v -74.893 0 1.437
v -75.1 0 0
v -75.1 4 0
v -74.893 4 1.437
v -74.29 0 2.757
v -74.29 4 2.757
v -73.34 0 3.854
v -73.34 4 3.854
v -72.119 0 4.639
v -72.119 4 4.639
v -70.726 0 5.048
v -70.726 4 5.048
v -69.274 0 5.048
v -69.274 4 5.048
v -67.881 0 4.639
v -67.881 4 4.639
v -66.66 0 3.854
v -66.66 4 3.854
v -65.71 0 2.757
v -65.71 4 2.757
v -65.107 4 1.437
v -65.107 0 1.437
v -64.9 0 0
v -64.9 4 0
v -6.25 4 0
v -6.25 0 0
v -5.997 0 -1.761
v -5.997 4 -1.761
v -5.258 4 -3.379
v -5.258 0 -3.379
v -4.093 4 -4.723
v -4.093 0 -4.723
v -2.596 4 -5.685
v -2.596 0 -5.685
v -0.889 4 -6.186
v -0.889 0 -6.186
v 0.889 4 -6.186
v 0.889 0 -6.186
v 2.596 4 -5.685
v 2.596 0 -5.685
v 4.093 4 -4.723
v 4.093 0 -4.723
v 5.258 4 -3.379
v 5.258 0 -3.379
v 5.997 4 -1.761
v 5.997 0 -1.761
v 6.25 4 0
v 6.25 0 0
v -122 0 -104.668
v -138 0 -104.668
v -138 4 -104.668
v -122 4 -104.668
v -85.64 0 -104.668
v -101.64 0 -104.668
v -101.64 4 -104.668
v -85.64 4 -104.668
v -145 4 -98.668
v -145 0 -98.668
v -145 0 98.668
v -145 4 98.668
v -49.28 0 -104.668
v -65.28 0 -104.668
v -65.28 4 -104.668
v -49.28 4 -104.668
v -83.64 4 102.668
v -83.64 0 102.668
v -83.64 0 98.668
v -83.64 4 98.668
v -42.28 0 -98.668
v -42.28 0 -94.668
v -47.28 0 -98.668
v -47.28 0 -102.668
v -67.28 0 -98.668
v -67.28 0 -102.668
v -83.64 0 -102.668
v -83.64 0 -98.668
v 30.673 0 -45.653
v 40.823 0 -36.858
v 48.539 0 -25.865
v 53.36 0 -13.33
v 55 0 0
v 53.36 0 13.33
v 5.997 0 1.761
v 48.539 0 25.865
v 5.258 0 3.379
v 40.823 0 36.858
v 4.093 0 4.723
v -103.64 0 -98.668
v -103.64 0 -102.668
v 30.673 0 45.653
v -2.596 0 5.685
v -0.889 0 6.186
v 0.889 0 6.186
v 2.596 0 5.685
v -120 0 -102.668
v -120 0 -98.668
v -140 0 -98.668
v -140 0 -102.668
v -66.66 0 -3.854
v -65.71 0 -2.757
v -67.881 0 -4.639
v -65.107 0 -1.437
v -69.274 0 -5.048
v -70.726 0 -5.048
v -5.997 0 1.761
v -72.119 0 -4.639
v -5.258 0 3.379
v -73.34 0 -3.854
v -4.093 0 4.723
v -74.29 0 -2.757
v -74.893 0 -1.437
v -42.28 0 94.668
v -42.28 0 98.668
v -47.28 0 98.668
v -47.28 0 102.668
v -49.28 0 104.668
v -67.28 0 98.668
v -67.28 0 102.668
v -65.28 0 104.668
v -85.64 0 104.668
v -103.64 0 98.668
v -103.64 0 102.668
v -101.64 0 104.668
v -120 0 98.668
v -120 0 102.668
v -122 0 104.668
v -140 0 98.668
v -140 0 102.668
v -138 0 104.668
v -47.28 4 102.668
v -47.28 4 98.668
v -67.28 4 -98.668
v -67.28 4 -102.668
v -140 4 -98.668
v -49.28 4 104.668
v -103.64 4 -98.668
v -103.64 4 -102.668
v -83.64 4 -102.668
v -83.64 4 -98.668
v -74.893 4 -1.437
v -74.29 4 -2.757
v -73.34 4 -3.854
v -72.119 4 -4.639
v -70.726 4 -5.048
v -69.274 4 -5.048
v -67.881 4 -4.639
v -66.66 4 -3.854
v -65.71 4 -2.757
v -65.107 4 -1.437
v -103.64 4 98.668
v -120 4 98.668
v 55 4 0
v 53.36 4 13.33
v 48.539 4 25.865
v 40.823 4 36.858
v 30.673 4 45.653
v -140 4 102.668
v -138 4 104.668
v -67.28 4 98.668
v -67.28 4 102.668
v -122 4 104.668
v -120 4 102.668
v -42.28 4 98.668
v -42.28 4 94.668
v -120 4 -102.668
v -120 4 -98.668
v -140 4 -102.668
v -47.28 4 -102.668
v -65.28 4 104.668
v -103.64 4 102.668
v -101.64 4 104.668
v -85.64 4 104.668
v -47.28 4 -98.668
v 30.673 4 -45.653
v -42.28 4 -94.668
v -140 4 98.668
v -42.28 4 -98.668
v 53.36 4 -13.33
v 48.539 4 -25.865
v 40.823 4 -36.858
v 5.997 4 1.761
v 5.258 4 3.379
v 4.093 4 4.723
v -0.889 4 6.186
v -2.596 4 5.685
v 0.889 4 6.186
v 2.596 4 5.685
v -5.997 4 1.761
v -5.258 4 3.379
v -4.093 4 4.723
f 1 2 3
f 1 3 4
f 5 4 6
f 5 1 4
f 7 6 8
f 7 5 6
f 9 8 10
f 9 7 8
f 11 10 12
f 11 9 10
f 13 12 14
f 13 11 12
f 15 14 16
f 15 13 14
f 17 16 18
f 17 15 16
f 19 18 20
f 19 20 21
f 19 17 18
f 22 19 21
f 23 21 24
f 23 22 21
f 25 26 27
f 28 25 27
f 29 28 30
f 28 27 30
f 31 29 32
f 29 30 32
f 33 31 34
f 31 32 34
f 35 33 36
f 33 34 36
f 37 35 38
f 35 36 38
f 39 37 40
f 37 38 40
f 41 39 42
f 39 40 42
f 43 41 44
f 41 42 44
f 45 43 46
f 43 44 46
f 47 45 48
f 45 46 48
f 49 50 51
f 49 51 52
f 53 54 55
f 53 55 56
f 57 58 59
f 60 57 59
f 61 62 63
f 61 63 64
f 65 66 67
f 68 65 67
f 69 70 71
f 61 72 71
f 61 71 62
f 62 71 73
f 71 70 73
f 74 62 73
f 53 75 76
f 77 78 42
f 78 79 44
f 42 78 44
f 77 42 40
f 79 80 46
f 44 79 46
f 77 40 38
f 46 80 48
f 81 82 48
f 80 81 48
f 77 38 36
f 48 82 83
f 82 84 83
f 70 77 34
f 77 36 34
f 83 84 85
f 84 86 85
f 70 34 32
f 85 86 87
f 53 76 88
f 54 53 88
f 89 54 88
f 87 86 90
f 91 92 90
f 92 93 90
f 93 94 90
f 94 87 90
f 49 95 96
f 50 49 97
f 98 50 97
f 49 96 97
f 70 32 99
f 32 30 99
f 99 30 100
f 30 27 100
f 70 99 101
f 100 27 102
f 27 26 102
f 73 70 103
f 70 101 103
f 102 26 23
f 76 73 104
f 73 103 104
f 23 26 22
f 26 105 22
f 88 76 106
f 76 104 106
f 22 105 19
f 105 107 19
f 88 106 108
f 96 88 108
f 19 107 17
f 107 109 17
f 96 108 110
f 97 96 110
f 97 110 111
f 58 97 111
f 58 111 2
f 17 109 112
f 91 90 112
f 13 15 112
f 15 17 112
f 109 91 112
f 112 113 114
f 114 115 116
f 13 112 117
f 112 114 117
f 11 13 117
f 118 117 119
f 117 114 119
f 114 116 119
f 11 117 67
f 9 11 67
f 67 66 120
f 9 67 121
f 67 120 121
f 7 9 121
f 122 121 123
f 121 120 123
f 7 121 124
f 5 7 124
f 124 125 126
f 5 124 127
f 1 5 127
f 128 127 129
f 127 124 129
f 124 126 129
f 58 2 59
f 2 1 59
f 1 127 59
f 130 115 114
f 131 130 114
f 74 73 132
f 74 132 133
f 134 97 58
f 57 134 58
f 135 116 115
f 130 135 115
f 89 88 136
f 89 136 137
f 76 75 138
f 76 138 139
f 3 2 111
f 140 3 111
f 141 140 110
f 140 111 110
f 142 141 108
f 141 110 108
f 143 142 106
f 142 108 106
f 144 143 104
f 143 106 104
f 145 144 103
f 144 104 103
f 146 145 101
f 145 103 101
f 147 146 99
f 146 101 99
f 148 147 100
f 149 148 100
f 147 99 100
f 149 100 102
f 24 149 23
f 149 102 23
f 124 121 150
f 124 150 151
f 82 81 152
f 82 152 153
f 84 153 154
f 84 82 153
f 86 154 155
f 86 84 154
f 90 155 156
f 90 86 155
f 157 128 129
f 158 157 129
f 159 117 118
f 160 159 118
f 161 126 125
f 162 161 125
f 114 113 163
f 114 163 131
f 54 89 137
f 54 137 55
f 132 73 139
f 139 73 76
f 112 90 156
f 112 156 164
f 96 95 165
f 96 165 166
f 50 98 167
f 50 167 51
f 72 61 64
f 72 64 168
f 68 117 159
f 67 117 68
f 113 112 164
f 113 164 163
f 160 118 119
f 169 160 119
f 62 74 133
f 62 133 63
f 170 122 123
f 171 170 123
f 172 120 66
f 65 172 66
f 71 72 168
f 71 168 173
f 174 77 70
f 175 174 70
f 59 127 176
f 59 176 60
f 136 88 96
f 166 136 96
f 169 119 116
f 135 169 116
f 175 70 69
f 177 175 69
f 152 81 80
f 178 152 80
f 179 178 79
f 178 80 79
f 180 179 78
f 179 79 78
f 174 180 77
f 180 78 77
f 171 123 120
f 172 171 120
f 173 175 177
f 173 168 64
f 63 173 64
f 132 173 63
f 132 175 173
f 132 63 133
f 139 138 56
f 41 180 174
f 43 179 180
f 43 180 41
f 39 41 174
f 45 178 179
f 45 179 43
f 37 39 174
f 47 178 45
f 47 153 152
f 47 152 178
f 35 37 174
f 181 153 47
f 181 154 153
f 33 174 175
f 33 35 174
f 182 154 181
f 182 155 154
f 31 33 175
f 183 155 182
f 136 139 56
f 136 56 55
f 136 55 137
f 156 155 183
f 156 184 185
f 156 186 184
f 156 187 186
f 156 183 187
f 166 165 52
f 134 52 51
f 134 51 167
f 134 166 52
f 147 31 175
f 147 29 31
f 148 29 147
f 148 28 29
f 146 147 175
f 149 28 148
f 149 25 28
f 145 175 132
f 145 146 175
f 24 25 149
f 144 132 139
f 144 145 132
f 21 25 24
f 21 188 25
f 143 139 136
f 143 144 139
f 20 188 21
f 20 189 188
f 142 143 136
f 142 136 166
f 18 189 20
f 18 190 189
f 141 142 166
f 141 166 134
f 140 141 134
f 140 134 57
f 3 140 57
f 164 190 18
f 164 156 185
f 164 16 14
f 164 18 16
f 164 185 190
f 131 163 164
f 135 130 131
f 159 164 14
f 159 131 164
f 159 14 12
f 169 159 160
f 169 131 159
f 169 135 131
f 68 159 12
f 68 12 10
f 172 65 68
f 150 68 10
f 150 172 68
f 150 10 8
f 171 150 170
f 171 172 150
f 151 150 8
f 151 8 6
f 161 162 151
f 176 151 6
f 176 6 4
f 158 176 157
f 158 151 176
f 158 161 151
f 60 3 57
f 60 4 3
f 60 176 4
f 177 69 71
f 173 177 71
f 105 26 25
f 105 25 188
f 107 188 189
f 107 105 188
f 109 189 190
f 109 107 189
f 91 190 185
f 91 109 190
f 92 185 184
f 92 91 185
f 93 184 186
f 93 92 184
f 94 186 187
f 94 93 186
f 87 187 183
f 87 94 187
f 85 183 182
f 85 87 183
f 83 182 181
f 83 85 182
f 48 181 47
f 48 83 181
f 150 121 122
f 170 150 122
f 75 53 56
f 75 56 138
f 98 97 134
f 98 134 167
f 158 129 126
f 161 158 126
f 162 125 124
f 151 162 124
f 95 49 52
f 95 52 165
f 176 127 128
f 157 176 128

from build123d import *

# Parameters (mm, degrees)
SM_BASE_FLANGE_1_DEPTH = 4
OTHER_1_DEPTH          = 4


# Read off the part's stored shape, not the designer's step: Выступы и прорези-Выступ1
# Sheet-metal steps are written as plain solids
with BuildPart() as part:
    # Sketch 1 → Базовая кромка1 (new body)
    with BuildSketch(Plane(origin=(0, 0, 0), x_dir=(1, 0, 0), z_dir=(0, 1, 0))):
        with BuildLine():
            Line((-145, -98.667725183), (-145, 0))
            Line((-145, 0), (-75.1, 0))
            ThreePointArc((-75.1, 0), (-70, -5.1), (-64.9, 0))
            Line((-64.9, 0), (-6.25, 0))
            ThreePointArc((-6.25, 0), (0, -6.25), (6.25, 0))
            Line((6.25, 0), (55, 0))
            ThreePointArc((55, 0), (48.538654235, -25.865015853), (30.672761998, -45.652838591))
            Line((30.672761998, -45.652838591), (-42.280195622, -94.667725183))
            Line((-42.280195622, -94.667725183), (-42.280195622, -98.667725183))
            Line((-42.280195622, -98.667725183), (-145, -98.667725183))
        make_face()
    extrude(amount=SM_BASE_FLANGE_1_DEPTH)

    # Other 1 outline → Other 1 (add)
    with BuildSketch(Plane(origin=(0, 0, 0), x_dir=(1, 0, 0), z_dir=(0, 1, 0))):
        Polygon((-47.280195622, -98.667725183), (-67.280195622, -98.667725183), (-67.280195622, -102.667725183), (-65.280195622, -104.667725183), (-49.280195622, -104.667725183), (-47.280195622, -102.667725183), align=None)
        Polygon((-83.640097811, -98.667725183), (-103.640097811, -98.667725183), (-103.640097811, -102.667725183), (-101.640097811, -104.667725183), (-85.640097811, -104.667725183), (-83.640097811, -102.667725183), align=None)
        Polygon((-140, -98.667725183), (-140, -102.667725183), (-138, -104.667725183), (-122, -104.667725183), (-120, -102.667725183), (-120, -98.667725183), align=None)
    extrude(amount=OTHER_1_DEPTH)

    # Зеркальное отражение1: part across plane


with BuildPart() as part_1:
    add(part.part)
    add(part.part.mirror(Plane(origin=(-145, 4, 0), x_dir=(1, 0, 0), z_dir=(0, 0, 1))))


solid = part_1.part
